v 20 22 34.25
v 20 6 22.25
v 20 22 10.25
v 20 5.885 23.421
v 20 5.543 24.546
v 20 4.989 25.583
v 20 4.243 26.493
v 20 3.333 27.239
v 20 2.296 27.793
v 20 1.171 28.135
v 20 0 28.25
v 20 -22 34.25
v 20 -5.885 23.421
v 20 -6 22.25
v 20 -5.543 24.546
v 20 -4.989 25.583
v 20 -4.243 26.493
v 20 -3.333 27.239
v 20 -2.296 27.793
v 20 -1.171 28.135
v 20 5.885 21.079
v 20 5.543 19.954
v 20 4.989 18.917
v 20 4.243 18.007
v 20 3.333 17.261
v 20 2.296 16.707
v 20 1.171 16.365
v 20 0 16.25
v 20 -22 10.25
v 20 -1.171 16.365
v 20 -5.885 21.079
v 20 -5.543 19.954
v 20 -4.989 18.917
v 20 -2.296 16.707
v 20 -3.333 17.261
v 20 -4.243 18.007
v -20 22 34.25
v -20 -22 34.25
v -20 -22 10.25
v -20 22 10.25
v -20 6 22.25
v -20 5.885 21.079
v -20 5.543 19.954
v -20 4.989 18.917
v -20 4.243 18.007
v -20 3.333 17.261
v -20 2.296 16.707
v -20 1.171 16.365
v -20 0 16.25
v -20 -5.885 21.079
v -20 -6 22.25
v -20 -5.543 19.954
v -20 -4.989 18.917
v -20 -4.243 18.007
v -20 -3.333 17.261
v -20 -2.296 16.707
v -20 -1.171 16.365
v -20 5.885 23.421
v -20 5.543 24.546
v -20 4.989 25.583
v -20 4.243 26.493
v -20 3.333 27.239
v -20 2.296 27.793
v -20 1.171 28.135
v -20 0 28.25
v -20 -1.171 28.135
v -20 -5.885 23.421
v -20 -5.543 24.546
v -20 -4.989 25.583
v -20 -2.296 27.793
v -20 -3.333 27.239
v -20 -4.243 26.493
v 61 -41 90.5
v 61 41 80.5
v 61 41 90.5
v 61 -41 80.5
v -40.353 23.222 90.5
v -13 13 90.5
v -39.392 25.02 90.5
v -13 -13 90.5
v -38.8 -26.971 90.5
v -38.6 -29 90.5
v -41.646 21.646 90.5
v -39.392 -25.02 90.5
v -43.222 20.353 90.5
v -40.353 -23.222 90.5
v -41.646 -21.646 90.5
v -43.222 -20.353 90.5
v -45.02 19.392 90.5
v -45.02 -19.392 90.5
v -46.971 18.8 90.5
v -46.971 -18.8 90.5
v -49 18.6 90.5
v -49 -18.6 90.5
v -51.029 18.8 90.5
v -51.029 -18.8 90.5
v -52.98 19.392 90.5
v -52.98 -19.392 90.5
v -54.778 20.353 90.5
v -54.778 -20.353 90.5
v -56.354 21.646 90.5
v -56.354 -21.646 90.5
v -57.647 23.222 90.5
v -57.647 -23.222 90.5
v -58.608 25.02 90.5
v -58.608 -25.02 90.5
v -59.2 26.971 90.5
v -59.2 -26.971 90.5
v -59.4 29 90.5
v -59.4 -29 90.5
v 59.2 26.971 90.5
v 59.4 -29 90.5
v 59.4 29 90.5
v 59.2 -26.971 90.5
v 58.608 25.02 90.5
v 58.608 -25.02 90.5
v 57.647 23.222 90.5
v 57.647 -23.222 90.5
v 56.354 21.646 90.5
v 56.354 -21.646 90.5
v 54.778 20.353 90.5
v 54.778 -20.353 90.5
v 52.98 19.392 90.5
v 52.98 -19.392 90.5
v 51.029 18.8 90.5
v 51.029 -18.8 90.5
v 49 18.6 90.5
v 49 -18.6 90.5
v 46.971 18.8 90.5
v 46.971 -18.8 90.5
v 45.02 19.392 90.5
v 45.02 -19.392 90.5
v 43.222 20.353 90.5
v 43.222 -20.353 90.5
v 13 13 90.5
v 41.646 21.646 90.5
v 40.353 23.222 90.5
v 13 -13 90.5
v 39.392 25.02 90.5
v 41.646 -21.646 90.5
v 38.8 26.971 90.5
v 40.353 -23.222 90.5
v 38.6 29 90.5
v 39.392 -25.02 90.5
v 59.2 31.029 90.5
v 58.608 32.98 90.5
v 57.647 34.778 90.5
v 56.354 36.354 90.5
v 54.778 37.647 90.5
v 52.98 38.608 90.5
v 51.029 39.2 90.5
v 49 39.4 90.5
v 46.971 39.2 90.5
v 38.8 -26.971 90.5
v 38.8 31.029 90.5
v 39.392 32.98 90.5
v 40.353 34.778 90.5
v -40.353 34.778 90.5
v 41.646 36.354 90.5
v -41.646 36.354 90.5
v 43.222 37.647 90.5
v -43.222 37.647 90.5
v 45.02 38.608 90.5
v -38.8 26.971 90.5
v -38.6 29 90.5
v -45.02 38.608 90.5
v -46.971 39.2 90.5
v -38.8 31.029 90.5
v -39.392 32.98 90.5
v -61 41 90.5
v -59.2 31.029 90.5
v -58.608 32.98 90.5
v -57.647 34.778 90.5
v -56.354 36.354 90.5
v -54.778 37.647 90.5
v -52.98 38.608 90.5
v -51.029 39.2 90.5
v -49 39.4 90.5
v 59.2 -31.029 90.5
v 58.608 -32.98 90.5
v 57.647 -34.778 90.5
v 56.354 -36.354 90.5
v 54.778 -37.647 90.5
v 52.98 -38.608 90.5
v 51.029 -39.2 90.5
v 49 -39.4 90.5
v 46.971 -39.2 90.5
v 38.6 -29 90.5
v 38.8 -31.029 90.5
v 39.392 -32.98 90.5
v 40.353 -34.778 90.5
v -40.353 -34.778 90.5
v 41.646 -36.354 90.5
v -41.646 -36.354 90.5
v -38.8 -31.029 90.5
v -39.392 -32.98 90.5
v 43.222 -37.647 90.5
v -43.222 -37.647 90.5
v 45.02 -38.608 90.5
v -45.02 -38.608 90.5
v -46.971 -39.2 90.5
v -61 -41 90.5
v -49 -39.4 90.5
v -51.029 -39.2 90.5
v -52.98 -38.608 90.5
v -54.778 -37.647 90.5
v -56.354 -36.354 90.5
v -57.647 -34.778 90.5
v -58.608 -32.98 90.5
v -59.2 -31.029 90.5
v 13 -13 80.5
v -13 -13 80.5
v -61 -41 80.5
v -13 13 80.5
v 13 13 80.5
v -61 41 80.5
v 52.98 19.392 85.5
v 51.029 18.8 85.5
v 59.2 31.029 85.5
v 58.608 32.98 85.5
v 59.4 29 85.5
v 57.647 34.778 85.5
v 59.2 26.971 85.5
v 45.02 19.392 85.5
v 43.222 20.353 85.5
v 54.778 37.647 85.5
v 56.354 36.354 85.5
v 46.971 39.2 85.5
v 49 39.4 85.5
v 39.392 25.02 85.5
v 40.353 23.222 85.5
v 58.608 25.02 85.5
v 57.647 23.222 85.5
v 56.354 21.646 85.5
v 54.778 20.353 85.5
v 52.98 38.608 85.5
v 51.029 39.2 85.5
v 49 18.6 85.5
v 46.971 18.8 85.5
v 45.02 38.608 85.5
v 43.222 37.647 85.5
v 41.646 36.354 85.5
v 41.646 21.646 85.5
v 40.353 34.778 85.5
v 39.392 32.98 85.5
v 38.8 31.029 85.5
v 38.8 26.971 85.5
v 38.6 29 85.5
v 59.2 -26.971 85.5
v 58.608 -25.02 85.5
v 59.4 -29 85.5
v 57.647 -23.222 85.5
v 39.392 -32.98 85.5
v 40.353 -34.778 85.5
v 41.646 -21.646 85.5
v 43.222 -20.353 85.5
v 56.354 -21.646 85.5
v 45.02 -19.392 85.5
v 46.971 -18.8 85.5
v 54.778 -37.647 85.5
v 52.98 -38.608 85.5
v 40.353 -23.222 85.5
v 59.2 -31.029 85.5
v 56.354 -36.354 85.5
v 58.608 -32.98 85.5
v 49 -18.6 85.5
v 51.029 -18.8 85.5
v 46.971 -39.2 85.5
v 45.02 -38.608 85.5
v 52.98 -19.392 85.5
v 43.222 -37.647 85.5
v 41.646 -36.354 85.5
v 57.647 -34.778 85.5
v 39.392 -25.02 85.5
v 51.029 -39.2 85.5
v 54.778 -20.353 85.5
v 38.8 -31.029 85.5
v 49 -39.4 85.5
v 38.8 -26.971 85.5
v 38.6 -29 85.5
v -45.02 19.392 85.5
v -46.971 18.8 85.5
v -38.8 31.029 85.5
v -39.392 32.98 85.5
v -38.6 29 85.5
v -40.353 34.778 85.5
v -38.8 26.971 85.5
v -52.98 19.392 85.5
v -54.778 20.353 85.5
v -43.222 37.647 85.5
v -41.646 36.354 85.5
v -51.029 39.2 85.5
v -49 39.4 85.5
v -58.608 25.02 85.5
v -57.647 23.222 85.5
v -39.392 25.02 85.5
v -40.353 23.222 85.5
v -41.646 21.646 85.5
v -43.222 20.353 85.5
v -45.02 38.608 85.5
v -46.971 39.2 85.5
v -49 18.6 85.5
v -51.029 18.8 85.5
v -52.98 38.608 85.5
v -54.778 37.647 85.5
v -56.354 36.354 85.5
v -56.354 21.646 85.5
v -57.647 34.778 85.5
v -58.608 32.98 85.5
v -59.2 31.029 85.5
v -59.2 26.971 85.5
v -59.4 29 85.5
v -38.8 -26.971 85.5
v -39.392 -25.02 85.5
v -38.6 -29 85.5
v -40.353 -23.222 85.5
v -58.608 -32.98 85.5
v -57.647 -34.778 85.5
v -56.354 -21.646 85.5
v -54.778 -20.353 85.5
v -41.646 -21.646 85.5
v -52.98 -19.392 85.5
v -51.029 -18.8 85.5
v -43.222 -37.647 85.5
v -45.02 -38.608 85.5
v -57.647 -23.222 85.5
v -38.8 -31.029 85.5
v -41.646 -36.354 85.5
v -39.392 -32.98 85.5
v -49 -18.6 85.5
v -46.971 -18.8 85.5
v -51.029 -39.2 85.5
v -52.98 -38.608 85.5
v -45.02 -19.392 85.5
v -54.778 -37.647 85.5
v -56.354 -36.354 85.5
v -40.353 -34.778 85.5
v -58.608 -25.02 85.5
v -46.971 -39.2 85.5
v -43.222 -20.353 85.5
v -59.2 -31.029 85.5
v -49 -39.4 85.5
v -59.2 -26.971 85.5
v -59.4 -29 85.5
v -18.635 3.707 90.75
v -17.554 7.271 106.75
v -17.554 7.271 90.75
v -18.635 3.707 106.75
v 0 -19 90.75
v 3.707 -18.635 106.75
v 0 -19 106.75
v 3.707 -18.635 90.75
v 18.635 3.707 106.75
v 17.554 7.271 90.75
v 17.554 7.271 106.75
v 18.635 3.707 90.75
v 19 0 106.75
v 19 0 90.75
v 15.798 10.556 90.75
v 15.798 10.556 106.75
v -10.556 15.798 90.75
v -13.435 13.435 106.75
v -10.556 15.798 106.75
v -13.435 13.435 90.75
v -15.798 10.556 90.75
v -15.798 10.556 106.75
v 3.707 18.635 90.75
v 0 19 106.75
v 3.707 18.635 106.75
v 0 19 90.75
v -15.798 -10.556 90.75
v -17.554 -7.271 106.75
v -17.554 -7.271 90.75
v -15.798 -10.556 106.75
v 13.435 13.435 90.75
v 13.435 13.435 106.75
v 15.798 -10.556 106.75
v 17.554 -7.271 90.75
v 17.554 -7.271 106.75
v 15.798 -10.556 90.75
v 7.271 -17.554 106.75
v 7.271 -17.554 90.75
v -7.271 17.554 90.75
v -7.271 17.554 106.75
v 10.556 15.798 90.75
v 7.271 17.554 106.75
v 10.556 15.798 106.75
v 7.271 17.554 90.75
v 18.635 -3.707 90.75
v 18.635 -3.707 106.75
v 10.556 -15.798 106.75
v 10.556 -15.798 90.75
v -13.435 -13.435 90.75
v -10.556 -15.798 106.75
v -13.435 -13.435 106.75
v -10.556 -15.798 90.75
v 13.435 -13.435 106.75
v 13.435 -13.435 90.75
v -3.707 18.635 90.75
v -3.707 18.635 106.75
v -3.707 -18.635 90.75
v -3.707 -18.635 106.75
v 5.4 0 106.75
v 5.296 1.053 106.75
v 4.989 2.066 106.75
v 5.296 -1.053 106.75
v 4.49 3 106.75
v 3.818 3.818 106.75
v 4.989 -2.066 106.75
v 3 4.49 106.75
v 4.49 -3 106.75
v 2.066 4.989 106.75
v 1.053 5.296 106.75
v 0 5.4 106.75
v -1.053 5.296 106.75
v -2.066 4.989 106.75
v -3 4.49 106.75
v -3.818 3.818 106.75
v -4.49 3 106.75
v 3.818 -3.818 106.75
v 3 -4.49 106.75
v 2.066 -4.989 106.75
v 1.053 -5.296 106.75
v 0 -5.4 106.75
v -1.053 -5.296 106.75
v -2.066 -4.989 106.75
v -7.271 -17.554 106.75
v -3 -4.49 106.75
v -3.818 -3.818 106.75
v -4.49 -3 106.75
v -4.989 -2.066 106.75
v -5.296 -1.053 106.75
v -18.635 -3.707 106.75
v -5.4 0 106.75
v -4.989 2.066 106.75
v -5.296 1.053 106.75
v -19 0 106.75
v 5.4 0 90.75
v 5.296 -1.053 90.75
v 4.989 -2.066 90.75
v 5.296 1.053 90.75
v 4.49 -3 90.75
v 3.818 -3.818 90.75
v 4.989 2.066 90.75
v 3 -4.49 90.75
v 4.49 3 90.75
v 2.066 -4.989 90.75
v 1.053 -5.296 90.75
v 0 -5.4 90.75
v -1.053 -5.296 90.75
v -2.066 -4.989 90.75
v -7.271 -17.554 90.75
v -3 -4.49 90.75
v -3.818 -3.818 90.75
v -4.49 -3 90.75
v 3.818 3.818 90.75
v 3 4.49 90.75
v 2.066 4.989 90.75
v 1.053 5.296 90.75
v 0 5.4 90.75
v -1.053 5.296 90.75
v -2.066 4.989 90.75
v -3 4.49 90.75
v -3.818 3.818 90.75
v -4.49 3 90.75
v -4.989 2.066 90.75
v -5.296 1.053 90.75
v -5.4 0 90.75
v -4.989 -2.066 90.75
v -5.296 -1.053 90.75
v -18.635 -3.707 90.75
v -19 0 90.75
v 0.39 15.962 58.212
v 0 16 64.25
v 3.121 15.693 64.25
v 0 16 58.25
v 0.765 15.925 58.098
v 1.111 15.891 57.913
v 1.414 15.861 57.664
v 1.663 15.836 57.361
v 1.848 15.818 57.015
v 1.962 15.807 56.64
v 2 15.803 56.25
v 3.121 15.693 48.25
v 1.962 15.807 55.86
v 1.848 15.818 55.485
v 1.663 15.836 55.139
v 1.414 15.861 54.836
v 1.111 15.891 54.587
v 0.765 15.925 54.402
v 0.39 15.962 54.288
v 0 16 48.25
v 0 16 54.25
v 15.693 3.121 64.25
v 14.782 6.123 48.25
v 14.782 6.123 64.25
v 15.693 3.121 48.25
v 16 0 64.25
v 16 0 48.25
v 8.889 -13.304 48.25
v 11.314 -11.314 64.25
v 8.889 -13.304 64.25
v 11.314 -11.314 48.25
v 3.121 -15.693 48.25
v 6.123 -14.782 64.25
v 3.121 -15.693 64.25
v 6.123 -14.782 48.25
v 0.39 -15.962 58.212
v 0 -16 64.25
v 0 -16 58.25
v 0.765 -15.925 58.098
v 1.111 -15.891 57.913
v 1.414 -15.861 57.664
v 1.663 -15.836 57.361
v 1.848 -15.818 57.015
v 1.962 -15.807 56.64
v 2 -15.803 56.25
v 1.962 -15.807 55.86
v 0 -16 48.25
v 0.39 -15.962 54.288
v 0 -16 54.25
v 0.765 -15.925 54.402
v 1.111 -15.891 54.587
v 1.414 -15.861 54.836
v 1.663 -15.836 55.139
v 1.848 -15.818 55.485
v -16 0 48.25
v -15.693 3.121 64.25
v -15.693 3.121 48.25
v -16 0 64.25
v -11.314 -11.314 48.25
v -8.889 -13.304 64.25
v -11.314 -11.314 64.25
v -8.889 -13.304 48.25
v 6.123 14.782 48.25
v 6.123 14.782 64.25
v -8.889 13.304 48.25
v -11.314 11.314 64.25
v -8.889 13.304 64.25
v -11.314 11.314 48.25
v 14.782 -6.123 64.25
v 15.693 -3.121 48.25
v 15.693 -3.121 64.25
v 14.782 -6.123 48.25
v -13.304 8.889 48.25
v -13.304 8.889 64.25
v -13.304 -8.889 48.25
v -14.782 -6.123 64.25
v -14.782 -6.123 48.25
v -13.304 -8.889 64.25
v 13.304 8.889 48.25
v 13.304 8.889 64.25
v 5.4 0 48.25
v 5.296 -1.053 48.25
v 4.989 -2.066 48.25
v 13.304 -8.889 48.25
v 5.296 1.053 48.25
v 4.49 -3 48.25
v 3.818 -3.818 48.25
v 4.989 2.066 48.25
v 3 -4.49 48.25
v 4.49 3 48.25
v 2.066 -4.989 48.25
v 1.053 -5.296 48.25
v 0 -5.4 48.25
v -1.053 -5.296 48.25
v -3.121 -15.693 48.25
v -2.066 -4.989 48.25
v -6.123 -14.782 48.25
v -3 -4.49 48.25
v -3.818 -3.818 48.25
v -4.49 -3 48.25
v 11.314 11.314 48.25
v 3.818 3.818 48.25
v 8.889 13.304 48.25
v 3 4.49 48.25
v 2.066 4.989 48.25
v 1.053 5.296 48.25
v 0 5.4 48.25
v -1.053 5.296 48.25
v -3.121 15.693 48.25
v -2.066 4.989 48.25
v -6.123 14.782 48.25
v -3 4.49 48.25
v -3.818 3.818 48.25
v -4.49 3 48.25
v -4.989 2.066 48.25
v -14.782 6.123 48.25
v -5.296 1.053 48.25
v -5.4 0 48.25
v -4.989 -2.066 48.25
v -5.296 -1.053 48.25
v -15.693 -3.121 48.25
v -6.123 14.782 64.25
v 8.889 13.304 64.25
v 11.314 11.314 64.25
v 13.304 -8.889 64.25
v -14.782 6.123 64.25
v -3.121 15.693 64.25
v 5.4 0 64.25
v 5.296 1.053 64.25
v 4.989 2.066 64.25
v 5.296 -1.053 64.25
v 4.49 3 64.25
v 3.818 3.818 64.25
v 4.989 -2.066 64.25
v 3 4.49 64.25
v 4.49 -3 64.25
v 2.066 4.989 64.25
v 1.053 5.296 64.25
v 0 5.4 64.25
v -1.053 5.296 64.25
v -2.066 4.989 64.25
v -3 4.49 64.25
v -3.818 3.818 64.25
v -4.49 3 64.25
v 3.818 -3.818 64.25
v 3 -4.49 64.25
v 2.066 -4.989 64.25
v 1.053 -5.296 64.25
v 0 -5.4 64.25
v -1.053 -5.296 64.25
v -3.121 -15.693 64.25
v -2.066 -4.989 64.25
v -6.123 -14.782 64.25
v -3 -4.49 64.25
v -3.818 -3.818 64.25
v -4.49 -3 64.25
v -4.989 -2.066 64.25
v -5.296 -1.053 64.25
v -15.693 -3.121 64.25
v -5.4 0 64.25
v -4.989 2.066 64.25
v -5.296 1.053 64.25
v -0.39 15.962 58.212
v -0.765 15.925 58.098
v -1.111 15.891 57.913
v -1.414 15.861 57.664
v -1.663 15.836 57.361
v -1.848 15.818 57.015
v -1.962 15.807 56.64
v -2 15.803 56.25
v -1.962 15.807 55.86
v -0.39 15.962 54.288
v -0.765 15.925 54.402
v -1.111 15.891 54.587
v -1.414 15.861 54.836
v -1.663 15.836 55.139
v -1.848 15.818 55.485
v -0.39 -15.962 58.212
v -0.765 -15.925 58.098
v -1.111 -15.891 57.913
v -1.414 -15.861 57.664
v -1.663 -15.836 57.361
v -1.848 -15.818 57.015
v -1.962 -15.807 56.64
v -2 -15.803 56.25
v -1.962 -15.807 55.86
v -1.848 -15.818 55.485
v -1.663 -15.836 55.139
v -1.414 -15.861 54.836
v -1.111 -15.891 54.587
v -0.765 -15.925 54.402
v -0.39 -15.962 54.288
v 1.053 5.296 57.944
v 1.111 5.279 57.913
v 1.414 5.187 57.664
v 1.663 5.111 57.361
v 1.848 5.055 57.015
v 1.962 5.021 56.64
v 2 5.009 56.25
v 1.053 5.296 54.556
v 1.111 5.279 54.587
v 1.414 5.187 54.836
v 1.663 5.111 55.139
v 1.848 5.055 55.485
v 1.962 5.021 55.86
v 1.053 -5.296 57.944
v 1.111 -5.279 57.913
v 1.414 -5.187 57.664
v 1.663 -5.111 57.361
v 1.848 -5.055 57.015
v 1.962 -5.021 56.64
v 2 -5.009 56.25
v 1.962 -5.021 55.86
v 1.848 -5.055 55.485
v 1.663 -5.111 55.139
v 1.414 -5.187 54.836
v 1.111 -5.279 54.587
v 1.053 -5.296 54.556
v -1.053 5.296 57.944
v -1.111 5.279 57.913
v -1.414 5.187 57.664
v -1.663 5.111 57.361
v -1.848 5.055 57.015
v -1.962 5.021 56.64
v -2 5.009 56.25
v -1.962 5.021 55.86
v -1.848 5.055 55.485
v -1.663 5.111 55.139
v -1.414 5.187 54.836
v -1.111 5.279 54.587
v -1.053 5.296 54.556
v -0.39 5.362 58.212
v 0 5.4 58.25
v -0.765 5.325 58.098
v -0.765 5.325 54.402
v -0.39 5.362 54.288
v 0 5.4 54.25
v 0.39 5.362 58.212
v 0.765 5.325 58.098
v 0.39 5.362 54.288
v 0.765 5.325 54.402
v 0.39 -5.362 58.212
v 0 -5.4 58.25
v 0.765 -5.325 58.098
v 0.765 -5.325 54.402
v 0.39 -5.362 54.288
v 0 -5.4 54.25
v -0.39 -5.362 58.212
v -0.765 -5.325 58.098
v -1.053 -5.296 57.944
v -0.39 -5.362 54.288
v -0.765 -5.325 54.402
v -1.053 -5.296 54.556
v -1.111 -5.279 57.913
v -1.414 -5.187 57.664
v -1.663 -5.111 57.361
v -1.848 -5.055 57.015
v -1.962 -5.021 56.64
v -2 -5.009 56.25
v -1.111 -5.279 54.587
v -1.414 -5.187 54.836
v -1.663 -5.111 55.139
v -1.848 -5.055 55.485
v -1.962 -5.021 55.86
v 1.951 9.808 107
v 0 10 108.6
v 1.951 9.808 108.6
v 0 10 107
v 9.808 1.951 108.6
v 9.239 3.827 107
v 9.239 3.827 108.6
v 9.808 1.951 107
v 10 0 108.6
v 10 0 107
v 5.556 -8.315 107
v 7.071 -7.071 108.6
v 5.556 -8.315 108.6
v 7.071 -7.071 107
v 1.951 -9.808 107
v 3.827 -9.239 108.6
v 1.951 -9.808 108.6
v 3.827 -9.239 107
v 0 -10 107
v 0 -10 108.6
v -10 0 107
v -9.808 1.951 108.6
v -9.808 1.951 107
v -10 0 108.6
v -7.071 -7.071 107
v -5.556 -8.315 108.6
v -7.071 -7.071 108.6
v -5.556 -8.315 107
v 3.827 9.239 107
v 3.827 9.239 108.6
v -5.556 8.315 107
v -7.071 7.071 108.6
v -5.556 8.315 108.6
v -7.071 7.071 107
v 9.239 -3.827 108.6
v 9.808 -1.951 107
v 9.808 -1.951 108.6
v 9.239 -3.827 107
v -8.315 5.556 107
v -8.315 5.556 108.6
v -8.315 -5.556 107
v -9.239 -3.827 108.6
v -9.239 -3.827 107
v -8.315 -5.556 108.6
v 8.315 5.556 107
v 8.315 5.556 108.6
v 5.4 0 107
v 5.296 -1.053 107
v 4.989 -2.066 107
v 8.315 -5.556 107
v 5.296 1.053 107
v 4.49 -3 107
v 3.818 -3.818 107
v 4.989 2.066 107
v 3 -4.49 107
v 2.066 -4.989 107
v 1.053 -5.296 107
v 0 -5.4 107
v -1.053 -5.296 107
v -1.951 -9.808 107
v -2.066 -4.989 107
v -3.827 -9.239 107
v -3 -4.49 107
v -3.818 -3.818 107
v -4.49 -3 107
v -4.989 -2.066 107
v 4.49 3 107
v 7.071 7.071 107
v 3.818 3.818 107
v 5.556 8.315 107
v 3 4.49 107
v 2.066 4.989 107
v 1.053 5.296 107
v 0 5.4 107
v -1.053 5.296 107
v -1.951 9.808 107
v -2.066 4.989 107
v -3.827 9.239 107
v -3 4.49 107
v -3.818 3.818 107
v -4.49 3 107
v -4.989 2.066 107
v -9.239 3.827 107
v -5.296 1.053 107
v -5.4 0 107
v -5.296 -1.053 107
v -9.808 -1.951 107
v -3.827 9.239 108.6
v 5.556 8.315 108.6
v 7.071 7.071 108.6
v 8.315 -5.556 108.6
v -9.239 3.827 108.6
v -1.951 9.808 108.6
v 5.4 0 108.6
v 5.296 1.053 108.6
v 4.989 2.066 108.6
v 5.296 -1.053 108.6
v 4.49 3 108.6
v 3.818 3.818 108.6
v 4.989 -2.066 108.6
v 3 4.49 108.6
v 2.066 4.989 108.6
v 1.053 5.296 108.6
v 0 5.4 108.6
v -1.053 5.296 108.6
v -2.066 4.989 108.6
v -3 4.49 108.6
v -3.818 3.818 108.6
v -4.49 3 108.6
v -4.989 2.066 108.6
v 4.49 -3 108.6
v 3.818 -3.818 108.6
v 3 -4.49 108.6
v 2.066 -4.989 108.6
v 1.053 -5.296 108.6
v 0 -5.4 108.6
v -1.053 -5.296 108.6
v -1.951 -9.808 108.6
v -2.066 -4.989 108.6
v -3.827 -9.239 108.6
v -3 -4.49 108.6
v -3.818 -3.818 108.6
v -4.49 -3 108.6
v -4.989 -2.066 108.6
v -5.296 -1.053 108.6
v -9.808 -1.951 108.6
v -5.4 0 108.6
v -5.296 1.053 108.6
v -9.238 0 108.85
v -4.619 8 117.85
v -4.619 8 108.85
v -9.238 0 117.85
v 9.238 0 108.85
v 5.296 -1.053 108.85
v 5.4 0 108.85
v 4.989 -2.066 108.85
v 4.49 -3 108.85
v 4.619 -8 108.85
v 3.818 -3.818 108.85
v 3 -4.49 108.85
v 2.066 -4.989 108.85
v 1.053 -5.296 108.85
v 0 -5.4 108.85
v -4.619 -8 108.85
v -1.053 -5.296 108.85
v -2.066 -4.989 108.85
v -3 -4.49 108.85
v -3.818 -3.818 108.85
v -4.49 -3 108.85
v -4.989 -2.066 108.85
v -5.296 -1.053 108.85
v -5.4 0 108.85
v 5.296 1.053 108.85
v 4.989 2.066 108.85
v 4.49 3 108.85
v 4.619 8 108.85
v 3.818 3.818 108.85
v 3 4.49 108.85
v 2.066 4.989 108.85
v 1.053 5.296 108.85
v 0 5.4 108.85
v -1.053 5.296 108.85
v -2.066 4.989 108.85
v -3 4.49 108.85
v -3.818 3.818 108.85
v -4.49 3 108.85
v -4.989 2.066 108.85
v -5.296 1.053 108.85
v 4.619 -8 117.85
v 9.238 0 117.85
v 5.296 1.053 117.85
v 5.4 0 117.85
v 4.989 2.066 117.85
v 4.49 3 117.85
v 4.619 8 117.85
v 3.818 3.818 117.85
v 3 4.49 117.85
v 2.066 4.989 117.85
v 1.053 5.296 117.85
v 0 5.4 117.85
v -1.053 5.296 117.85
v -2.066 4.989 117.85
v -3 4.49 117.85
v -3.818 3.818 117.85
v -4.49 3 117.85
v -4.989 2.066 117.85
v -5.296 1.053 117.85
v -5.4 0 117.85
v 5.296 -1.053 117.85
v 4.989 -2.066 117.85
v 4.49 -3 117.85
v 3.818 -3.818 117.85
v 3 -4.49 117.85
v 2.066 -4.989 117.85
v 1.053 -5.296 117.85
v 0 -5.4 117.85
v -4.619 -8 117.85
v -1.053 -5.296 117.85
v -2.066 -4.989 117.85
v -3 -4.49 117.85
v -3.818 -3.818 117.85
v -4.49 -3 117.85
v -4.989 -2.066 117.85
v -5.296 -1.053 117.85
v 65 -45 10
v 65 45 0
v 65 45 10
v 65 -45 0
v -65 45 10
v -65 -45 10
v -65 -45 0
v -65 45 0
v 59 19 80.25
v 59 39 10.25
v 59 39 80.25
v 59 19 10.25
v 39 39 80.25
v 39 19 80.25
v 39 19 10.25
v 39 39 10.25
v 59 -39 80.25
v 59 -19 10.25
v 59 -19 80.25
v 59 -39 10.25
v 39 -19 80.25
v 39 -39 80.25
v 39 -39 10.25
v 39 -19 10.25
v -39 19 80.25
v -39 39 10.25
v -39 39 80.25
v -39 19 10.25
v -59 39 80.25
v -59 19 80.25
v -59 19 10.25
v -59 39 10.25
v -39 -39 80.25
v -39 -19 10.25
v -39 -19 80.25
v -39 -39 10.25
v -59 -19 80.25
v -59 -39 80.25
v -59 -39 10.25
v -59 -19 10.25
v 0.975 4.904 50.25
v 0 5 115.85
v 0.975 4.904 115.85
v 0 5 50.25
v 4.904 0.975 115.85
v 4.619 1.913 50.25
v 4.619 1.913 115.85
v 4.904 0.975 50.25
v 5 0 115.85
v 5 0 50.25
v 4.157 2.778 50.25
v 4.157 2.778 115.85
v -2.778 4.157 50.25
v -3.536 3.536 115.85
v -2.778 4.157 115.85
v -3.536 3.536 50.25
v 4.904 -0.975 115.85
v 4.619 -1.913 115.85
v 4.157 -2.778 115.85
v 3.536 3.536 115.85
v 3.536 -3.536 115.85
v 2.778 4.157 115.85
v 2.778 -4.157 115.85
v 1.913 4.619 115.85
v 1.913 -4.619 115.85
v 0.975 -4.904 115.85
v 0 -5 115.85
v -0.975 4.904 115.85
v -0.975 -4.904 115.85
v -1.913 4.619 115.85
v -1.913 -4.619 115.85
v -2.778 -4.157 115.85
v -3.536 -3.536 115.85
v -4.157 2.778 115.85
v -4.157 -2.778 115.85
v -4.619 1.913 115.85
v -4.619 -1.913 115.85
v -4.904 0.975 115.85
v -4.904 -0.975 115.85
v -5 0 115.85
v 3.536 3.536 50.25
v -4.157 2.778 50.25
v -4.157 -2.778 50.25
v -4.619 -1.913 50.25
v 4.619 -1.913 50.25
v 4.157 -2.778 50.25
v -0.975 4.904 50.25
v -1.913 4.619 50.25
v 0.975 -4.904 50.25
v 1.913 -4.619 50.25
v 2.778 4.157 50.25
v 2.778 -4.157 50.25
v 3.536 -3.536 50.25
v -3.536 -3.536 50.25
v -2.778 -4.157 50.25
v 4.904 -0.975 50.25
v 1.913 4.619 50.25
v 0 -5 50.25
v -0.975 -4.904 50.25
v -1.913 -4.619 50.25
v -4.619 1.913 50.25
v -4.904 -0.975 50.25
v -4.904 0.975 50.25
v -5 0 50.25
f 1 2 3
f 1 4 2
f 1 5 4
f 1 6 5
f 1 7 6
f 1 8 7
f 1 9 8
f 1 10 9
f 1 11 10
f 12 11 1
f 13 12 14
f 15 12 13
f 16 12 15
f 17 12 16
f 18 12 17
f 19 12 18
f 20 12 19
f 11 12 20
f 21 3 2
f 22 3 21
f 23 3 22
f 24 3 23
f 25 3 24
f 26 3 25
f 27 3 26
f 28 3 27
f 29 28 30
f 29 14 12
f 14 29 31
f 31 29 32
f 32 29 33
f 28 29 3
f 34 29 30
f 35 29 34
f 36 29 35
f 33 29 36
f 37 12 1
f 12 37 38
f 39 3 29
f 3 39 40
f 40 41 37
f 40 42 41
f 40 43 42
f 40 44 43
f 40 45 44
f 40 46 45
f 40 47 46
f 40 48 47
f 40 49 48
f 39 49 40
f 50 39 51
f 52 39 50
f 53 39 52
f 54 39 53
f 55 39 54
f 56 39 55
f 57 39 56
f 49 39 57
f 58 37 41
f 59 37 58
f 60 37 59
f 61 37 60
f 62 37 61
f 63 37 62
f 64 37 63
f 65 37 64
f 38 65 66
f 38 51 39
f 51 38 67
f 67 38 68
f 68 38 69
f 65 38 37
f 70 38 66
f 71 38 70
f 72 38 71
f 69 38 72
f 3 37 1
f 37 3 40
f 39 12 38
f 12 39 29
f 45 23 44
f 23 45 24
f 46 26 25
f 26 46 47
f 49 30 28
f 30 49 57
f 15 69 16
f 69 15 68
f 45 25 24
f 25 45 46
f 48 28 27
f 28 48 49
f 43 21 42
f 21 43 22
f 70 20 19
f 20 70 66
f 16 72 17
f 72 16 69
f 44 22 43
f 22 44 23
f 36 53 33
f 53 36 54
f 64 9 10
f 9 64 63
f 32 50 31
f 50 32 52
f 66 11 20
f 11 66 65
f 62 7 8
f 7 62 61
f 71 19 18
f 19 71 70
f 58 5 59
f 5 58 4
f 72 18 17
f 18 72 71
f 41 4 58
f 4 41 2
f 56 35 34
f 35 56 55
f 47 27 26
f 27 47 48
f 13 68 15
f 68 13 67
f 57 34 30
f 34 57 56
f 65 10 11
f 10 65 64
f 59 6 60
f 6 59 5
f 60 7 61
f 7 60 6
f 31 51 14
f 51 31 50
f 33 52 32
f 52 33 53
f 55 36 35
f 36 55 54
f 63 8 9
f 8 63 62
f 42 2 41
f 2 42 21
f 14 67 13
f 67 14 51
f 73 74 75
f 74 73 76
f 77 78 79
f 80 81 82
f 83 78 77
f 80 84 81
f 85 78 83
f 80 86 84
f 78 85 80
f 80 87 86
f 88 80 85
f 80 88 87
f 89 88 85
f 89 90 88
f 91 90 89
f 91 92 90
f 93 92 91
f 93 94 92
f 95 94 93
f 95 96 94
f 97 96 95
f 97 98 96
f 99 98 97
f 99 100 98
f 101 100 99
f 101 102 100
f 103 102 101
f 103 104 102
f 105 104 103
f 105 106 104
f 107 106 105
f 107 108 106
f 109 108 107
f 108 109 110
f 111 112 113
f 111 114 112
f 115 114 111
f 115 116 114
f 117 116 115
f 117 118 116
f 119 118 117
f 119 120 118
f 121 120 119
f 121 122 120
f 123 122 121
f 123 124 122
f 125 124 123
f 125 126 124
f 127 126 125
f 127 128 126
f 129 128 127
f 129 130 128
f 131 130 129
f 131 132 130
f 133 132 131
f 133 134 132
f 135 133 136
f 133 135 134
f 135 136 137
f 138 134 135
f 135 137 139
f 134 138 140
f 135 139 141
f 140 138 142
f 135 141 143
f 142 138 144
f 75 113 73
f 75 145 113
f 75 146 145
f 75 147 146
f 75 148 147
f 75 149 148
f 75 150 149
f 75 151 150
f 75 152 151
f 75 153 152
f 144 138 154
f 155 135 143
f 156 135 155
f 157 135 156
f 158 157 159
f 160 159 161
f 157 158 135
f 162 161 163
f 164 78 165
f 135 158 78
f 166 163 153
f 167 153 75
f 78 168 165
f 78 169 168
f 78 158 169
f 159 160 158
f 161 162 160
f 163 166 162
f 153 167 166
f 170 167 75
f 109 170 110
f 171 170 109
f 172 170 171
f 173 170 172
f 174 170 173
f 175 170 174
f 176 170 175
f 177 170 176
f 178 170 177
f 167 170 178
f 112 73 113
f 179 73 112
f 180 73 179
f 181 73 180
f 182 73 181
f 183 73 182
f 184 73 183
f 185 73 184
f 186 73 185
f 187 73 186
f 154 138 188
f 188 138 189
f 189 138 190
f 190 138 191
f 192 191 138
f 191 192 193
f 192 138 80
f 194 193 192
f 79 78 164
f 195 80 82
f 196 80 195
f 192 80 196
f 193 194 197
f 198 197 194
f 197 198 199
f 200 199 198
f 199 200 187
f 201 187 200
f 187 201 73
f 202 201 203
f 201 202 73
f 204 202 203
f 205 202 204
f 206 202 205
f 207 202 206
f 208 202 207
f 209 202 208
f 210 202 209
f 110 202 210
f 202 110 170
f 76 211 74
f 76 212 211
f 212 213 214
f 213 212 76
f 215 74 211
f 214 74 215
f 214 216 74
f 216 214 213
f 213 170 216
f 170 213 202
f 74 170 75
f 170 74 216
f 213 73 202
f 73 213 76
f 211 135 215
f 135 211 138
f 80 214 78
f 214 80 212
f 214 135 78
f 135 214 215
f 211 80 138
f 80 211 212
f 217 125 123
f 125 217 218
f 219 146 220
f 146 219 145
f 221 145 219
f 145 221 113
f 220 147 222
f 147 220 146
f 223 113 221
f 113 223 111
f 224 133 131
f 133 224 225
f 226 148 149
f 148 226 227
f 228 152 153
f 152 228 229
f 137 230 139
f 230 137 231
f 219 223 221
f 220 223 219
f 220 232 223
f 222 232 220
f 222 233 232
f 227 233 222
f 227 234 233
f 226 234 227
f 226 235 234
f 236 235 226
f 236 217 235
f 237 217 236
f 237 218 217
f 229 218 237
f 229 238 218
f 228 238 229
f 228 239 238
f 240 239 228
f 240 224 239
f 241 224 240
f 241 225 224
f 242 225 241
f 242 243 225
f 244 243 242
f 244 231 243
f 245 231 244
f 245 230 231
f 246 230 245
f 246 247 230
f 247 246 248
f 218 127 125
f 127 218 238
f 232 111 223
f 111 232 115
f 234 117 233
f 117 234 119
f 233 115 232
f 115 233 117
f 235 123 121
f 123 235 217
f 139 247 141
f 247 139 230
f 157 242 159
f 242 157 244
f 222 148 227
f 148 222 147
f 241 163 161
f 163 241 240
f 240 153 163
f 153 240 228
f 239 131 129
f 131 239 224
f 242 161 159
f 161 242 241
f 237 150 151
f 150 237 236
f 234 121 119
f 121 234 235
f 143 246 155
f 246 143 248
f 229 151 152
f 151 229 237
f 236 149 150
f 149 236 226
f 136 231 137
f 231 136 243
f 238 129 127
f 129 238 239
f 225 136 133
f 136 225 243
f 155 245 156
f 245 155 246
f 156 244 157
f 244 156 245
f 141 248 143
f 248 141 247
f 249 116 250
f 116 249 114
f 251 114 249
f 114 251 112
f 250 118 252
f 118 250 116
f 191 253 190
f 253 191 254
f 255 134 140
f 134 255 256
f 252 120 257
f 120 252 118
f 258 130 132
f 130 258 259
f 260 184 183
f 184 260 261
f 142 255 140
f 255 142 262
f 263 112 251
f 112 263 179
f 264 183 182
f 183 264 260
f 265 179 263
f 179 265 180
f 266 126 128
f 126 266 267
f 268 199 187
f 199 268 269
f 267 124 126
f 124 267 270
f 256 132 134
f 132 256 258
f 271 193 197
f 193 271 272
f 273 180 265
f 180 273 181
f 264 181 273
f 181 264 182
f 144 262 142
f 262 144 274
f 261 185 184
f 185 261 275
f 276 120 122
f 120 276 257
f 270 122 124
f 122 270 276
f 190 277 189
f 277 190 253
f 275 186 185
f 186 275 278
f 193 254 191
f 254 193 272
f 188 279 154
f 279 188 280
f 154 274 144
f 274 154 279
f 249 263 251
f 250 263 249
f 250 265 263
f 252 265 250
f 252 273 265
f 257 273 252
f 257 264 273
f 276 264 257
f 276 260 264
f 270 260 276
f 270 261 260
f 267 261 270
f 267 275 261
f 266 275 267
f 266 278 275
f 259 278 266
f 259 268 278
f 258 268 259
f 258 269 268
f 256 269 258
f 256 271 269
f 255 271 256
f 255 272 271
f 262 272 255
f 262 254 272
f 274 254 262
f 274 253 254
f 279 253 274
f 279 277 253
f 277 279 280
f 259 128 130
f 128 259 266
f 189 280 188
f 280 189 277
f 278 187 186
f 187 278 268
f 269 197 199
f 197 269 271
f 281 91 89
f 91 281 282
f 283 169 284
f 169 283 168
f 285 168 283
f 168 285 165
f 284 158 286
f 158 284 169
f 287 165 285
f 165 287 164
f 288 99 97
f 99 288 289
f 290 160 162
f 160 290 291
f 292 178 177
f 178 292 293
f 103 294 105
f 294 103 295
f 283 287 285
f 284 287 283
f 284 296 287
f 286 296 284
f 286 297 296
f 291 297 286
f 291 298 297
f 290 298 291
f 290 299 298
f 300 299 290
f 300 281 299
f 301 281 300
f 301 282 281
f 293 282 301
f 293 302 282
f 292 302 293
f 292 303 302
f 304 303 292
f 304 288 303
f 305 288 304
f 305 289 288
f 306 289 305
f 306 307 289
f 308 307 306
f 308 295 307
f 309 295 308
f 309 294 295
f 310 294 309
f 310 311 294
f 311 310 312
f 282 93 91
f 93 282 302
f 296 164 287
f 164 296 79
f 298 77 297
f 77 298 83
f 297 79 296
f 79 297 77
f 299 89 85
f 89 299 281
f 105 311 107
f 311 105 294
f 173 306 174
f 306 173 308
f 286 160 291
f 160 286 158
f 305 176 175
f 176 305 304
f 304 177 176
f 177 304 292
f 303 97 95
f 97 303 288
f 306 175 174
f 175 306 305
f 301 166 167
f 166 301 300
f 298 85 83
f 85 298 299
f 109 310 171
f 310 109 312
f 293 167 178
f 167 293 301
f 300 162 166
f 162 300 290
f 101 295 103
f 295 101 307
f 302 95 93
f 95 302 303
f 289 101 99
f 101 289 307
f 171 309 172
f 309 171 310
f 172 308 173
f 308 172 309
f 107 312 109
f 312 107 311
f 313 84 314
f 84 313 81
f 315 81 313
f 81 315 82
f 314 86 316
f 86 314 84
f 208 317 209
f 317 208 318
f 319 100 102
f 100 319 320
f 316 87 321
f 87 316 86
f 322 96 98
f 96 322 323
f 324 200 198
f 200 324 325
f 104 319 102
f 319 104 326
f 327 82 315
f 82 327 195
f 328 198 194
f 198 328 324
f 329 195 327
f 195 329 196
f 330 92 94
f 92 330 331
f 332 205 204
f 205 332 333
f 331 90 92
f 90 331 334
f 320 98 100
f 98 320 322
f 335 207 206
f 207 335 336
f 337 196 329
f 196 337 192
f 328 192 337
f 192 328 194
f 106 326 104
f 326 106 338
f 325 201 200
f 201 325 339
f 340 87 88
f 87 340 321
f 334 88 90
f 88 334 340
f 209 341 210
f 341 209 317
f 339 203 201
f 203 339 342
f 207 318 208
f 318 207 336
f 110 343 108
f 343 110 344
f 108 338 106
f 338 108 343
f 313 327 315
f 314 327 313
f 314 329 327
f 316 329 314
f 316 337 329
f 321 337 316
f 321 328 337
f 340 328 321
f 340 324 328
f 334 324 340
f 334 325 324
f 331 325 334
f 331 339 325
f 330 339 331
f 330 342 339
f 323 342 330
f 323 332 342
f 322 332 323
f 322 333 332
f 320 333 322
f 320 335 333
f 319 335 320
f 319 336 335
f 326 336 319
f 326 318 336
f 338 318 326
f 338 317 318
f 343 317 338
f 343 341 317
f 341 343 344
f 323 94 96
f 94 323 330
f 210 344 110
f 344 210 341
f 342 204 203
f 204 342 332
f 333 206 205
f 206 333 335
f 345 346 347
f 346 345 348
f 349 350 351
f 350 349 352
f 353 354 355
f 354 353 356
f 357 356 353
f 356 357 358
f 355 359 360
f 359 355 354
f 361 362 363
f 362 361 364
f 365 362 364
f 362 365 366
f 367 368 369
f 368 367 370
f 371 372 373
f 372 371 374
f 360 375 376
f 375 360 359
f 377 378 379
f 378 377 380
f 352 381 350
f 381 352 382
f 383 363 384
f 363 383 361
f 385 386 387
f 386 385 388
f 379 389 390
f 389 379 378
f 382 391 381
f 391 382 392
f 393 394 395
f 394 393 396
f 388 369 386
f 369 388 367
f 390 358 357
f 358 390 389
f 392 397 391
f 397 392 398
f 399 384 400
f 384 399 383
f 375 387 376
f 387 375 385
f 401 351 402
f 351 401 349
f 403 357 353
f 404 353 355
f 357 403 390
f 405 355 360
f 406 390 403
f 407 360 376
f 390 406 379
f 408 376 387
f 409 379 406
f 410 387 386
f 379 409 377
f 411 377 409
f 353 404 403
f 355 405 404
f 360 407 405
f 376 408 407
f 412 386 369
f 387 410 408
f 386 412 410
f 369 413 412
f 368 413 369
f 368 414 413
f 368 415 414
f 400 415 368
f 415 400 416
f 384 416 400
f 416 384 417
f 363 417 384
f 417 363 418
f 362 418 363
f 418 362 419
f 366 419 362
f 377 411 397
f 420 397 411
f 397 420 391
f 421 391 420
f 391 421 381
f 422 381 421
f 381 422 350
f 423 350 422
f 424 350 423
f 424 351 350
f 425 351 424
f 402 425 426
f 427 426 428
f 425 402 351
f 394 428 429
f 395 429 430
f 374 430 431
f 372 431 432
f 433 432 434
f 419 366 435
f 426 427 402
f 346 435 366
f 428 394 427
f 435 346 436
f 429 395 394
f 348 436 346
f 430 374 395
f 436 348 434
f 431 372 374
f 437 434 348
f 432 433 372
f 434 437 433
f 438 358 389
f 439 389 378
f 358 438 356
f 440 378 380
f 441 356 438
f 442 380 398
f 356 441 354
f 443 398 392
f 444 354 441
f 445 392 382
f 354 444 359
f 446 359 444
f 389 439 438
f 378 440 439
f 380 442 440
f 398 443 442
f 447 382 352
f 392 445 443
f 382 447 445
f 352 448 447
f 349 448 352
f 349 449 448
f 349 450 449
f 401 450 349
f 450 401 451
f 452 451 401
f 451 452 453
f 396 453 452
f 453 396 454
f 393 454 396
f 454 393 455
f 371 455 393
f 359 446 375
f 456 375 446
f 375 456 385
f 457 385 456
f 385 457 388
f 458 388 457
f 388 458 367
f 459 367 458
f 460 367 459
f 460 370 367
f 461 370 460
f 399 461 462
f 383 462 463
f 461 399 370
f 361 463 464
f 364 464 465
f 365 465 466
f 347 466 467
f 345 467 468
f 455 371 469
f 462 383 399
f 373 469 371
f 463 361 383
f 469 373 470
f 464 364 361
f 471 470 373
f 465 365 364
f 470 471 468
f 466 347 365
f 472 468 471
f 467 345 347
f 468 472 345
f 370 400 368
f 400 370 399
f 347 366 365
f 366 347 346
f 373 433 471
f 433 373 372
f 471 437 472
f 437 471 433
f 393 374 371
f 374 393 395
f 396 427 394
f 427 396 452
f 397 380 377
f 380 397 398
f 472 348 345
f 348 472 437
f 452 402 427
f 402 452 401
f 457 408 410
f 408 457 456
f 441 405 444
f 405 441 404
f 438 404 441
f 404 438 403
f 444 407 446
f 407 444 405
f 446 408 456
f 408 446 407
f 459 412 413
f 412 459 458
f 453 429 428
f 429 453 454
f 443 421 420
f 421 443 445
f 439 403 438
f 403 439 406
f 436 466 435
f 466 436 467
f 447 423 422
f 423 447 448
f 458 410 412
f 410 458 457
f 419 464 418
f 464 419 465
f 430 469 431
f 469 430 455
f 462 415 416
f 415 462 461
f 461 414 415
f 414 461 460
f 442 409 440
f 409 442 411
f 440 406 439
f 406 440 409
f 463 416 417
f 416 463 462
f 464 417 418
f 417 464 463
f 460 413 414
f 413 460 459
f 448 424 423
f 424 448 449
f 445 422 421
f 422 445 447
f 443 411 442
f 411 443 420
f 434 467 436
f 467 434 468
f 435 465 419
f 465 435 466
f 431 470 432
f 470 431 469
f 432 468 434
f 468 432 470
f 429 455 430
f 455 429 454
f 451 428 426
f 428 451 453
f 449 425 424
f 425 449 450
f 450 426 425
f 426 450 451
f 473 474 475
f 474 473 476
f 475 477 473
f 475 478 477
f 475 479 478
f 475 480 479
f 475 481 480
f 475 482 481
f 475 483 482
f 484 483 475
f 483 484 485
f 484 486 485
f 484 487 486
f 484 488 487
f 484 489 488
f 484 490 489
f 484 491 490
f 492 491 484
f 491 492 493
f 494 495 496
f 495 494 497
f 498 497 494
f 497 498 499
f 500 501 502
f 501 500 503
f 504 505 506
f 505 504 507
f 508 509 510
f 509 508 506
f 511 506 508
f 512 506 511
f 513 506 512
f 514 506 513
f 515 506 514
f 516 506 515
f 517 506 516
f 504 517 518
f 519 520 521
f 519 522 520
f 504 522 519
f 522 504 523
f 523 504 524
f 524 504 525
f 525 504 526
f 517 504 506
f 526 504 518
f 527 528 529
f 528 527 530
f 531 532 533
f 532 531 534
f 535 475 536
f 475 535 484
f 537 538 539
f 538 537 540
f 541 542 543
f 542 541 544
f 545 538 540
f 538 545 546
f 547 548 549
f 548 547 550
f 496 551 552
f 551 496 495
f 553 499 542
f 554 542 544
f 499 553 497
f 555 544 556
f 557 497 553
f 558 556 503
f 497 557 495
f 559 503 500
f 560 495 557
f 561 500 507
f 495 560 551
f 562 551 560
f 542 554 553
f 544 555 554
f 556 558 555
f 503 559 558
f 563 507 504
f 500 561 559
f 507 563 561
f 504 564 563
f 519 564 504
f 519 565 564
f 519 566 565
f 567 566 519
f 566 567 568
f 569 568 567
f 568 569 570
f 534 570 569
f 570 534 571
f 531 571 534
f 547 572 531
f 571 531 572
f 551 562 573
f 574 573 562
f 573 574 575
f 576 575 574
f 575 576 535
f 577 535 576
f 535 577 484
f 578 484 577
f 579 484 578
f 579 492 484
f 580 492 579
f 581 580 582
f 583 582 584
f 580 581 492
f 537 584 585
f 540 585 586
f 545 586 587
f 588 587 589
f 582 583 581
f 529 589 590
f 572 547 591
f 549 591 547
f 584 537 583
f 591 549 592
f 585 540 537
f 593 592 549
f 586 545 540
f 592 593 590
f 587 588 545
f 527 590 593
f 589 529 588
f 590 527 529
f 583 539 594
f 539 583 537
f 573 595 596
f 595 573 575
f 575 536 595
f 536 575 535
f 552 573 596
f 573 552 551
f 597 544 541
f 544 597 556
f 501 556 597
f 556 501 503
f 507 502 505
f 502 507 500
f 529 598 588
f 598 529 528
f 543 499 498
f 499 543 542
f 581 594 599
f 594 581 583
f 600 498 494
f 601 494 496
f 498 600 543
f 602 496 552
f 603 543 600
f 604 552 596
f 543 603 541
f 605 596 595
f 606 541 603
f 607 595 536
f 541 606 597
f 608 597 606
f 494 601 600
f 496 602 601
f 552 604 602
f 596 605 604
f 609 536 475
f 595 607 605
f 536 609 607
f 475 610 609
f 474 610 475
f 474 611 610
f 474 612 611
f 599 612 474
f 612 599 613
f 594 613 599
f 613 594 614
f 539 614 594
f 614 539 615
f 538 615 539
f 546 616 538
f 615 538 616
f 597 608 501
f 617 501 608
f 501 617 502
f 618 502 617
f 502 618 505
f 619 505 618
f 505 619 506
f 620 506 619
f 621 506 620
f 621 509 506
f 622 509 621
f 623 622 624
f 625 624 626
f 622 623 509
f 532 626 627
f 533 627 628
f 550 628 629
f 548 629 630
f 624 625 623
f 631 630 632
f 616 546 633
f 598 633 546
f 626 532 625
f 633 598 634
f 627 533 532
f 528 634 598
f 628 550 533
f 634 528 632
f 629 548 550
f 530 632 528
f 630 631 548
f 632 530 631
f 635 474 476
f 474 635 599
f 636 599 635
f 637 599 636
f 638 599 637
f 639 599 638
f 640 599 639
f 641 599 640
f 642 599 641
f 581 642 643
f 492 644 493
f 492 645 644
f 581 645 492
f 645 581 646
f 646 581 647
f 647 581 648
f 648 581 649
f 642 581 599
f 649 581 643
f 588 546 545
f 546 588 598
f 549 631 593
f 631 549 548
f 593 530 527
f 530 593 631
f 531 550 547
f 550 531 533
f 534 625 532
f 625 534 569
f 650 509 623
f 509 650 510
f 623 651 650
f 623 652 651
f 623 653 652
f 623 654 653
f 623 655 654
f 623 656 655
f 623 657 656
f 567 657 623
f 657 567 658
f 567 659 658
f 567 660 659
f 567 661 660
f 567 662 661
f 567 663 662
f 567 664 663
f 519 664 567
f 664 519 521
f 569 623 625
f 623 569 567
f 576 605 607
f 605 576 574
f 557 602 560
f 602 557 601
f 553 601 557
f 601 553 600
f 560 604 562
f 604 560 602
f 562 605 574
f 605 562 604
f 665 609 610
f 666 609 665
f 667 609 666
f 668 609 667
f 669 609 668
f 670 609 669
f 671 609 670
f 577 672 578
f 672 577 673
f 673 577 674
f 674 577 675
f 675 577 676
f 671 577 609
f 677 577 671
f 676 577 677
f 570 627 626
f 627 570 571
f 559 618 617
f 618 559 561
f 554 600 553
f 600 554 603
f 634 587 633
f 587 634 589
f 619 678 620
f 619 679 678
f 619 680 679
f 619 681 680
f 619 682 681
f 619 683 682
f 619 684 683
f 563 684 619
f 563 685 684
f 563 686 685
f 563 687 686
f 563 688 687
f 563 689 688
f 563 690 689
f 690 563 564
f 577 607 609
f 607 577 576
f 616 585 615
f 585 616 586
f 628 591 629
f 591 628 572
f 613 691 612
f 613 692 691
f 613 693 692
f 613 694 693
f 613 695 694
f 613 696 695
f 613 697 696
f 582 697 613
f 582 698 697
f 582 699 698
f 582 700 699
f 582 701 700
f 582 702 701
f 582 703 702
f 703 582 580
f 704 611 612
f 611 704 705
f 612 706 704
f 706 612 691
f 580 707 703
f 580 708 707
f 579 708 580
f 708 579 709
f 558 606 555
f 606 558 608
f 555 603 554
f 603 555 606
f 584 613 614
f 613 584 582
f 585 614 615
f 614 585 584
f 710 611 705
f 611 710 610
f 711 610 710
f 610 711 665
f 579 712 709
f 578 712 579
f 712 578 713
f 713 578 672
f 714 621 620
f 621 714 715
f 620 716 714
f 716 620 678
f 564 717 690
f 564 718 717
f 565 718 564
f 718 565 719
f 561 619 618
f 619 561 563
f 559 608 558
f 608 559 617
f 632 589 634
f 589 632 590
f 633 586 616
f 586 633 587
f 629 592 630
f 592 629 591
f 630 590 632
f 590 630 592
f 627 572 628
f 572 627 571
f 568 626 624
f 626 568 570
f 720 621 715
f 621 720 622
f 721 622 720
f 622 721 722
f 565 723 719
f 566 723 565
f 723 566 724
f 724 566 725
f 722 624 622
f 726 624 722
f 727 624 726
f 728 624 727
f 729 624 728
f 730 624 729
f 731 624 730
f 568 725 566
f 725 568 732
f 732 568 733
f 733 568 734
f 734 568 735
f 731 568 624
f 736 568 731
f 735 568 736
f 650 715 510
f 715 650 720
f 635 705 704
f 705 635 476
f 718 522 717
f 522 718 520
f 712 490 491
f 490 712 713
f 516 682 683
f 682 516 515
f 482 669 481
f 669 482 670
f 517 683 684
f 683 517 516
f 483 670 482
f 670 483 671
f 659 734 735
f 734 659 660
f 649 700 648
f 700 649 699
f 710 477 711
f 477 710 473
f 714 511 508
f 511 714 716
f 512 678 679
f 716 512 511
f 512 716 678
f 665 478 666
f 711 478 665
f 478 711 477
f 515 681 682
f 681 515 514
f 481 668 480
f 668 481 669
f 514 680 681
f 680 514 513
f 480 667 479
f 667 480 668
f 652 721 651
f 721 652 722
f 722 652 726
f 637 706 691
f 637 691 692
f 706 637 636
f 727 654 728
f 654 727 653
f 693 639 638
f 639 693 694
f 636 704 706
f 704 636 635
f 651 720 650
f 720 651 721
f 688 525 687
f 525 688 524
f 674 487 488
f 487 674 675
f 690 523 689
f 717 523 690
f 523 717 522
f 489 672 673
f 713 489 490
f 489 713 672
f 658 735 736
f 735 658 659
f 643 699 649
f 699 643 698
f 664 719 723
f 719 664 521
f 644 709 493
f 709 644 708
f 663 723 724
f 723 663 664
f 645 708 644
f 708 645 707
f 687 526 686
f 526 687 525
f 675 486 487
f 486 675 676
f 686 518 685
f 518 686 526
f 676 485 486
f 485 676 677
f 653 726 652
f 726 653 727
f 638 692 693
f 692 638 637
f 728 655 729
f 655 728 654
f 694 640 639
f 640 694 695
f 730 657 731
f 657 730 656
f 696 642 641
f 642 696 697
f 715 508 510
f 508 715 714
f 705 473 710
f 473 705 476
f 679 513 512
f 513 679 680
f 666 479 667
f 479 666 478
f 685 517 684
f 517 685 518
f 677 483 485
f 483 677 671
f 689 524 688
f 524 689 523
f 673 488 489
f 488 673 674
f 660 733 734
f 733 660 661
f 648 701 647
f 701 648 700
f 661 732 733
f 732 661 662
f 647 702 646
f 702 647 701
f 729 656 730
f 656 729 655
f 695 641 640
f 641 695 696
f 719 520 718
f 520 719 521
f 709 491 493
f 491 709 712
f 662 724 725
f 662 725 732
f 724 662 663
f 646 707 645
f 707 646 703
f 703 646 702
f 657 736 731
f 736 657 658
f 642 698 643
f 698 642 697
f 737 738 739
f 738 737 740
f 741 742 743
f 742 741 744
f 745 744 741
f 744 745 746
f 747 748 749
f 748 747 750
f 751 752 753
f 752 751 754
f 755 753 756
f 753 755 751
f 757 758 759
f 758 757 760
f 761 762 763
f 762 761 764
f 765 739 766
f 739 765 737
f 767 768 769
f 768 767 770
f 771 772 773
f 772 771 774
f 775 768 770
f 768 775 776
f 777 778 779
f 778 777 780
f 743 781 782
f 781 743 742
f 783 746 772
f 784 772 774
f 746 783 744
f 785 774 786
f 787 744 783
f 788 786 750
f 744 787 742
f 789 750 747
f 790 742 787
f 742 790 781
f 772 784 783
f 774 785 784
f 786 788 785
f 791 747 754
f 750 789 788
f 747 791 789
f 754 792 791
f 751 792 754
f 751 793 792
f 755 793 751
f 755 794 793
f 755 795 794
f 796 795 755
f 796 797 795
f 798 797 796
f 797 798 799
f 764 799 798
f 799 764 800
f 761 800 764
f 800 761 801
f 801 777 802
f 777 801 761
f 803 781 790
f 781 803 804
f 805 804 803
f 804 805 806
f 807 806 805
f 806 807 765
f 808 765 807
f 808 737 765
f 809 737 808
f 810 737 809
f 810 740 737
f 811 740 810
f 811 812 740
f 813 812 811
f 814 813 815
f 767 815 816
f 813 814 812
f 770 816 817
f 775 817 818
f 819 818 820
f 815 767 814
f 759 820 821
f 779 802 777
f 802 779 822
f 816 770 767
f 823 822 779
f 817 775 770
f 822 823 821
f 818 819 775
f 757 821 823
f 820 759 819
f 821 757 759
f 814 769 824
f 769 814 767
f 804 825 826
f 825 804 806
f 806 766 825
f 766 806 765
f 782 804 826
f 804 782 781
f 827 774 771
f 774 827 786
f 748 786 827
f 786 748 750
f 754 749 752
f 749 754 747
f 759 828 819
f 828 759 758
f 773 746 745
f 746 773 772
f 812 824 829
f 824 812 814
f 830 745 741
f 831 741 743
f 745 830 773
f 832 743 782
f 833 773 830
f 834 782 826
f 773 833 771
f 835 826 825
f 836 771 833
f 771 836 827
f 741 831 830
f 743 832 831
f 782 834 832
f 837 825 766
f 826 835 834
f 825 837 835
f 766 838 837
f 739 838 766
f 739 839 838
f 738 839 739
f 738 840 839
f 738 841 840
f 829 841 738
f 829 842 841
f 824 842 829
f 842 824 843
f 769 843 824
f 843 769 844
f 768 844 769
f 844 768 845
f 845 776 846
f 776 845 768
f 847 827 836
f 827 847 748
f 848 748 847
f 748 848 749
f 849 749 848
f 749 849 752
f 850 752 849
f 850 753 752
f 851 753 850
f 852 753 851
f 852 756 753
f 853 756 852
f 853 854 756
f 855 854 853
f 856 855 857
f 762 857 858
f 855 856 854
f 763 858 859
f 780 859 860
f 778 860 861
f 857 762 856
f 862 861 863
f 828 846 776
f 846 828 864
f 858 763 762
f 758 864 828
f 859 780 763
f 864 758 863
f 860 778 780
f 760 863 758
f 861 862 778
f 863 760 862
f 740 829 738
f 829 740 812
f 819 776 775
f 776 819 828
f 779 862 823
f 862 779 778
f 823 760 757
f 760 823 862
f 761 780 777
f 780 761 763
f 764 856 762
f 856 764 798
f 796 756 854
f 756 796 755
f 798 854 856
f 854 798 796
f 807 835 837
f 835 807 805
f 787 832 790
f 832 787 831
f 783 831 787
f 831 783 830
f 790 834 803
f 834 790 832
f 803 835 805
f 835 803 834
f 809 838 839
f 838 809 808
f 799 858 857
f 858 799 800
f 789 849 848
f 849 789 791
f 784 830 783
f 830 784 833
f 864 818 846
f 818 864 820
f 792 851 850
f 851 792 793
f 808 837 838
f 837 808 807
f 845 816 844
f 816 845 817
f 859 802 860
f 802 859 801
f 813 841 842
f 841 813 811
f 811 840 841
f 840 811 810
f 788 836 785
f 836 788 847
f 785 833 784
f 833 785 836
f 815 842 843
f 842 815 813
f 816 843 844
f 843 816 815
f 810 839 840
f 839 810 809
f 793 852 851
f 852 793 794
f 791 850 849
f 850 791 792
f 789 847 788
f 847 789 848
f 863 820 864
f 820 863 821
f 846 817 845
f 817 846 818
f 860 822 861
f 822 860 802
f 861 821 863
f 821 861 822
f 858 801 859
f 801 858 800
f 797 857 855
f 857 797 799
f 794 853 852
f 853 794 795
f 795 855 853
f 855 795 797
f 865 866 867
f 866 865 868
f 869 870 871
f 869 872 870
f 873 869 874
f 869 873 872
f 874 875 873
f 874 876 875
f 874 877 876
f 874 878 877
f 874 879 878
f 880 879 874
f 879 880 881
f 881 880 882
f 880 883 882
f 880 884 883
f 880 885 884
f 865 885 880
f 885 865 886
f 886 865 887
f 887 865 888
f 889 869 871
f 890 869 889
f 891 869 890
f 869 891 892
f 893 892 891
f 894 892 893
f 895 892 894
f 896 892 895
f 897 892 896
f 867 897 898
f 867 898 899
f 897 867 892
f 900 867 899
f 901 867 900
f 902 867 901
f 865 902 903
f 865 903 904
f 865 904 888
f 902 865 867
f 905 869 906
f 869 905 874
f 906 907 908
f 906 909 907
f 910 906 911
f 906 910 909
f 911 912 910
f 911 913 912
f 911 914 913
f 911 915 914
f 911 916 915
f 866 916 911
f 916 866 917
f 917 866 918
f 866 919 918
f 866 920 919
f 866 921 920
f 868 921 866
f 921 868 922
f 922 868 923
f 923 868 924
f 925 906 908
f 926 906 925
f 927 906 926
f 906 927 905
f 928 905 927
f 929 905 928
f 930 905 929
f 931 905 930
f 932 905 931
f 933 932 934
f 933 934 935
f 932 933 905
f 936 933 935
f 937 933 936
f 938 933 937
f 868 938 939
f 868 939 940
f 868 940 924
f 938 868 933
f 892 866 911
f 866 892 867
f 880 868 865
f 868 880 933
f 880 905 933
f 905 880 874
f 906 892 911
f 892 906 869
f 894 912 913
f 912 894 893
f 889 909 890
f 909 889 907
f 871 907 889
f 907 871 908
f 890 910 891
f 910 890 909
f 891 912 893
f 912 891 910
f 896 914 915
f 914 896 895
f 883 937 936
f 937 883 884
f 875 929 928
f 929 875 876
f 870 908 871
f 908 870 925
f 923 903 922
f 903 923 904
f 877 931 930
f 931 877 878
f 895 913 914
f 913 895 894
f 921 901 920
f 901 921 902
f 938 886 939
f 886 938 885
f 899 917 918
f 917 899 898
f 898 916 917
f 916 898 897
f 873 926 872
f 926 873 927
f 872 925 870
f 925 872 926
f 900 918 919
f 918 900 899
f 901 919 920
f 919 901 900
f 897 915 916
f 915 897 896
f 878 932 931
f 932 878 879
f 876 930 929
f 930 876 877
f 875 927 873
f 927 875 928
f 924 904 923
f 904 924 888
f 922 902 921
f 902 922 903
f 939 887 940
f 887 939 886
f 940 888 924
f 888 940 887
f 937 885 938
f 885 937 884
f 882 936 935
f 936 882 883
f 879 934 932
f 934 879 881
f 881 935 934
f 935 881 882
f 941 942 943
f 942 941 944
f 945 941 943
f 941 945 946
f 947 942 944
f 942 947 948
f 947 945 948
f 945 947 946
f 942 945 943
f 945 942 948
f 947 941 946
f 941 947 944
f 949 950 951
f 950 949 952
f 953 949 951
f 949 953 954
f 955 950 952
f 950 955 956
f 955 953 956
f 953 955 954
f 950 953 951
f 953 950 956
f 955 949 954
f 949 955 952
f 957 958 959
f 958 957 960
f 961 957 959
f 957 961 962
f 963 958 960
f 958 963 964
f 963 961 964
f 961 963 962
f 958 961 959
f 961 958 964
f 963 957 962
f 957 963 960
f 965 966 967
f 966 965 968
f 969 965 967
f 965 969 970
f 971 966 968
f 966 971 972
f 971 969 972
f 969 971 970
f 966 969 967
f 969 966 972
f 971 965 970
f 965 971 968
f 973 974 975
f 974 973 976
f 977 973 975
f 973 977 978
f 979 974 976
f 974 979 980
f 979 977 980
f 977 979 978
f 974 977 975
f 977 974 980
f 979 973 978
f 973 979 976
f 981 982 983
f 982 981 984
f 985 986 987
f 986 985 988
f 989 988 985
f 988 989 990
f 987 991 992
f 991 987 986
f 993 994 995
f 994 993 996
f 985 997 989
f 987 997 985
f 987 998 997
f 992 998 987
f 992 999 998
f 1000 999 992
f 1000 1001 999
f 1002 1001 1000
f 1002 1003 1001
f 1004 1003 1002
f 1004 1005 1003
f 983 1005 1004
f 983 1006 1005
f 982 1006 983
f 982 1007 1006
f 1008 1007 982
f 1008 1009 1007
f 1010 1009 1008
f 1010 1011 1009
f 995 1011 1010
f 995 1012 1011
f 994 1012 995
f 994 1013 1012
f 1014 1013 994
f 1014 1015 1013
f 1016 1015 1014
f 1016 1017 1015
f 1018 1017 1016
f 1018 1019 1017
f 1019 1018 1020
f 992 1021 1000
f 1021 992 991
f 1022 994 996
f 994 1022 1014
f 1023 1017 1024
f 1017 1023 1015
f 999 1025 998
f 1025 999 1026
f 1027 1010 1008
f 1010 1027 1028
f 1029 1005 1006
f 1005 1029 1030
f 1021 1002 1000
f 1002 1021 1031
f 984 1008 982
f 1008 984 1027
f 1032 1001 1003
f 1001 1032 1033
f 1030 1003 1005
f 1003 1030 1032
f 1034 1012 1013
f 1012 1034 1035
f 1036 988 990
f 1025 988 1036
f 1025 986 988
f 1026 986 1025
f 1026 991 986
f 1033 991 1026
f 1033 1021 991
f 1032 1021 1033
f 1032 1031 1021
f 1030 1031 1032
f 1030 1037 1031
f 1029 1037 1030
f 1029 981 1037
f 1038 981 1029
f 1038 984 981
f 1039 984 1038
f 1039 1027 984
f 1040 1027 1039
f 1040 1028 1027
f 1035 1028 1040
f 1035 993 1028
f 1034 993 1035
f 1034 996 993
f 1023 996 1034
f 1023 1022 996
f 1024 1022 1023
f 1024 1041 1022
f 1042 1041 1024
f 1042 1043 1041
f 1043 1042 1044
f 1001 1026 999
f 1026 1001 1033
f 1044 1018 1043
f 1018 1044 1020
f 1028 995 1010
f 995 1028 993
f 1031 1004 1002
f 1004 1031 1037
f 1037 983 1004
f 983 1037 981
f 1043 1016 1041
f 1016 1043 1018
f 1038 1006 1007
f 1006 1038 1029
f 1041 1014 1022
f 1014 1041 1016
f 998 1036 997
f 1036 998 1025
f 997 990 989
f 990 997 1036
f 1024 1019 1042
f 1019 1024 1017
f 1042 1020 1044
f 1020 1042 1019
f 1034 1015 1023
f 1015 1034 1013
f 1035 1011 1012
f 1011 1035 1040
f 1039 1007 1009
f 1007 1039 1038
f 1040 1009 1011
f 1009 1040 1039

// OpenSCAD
$fn = 32;

// ------------------------------------------------------------------------
// Arbor press fixture: screw d10, posts 70 mm, gap 14 mm
// Every part is its own module, assembly() places every instance.
// ------------------------------------------------------------------------

// --- part 1 ---
module press_bed() {
  difference() {
    translate([-65, -45, 0]) cube([130, 90, 10]);
  }
}

// --- part 2 ---
module anvil_block() {
  difference() {
    translate([-20, -22, 0]) cube([40, 44, 24]);
    translate([0, 0, 12]) rotate([0, 90, 0]) cylinder(h = 42, d = 12, center = true);
  }
}

// --- part 3 ---
module press_post_a() {
  translate([-10, -10, 0]) cube([20, 20, 70]);
}

// --- part 4 ---
module press_post_b() {
  translate([-10, -10, 0]) cube([20, 20, 70]);
}

// --- part 5 ---
module press_post_c() {
  translate([-10, -10, 0]) cube([20, 20, 70]);
}

// --- part 6 ---
module press_post_d() {
  translate([-10, -10, 0]) cube([20, 20, 70]);
}

// --- part 7 ---
module press_frame() {
  difference() {
    translate([-61, -41, 0]) cube([122, 82, 10]);
    translate([-13, -13, -1]) cube([26, 26, 12]);
    translate([49, 29, 5]) cylinder(h = 6, d = 20.8);
    translate([49, -29, 5]) cylinder(h = 6, d = 20.8);
    translate([-49, 29, 5]) cylinder(h = 6, d = 20.8);
    translate([-49, -29, 5]) cylinder(h = 6, d = 20.8);
  }
}

// --- part 8 ---
module guide_ring() {
  difference() {
      translate([0, 0, 0]) cylinder(h = 16, d = 38);
      translate([0, 0, -1]) cylinder(h = 18, d = 10.8);
    }
}

// --- part 9 ---
module press_screw() {
  translate([0, 0, -32.8]) cylinder(h = 65.6, d = 10);
}

// --- part 10 ---
module press_head() {
  difference() {
    cylinder(h = 16, d = 32);
    translate([0, 0, -1]) cylinder(h = 18, d = 10.8);
    translate([0, 0, 8]) rotate([90, 0, 0]) cylinder(h = 34, d = 4, center = true);
  }
}

// --- part 11 ---
module nut_washer() {
  difference() {
      translate([0, 0, 0]) cylinder(h = 1.6, d = 20);
      translate([0, 0, -1]) cylinder(h = 3.6, d = 10.8);
    }
}

// --- part 12 ---
module press_nut() {
  difference() {
    linear_extrude(height = 9) polygon(points = [[9.238, 0], [4.619, 8], [-4.619, 8], [-9.238, 0], [-4.619, -8], [4.619, -8]]);
    translate([0, 0, -1]) cylinder(h = 11, d = 10.8);
  }
}

// --- assembly ---
module assembly() {
  color([0.80, 0.24, 0.20]) translate([0, 0, 0]) rotate([0, 0, 0]) press_bed();
  color([0.20, 0.45, 0.75]) translate([0, 0, 10.25]) rotate([0, 0, 0]) anvil_block();
  color([0.25, 0.62, 0.32]) translate([49, 29, 10.25]) rotate([0, 0, 0]) press_post_a();
  color([0.92, 0.70, 0.18]) translate([49, -29, 10.25]) rotate([0, 0, 0]) press_post_b();
  color([0.58, 0.35, 0.70]) translate([-49, 29, 10.25]) rotate([0, 0, 0]) press_post_c();
  color([0.16, 0.66, 0.66]) translate([-49, -29, 10.25]) rotate([0, 0, 0]) press_post_d();
  color([0.85, 0.48, 0.18]) translate([0, 0, 80.5]) rotate([0, 0, 0]) press_frame();
  color([0.55, 0.60, 0.65]) translate([0, 0, 90.75]) rotate([0, 0, 0]) guide_ring();
  color([0.75, 0.30, 0.55]) translate([0, 0, 83.05]) rotate([0, 0, 0]) press_screw();
  color([0.42, 0.52, 0.28]) translate([0, 0, 48.25]) rotate([0, 0, 0]) press_head();
  color([0.80, 0.24, 0.20]) translate([0, 0, 107]) rotate([0, 0, 0]) nut_washer();
  color([0.20, 0.45, 0.75]) translate([0, 0, 108.85]) rotate([0, 0, 0]) press_nut();
}

assembly();
